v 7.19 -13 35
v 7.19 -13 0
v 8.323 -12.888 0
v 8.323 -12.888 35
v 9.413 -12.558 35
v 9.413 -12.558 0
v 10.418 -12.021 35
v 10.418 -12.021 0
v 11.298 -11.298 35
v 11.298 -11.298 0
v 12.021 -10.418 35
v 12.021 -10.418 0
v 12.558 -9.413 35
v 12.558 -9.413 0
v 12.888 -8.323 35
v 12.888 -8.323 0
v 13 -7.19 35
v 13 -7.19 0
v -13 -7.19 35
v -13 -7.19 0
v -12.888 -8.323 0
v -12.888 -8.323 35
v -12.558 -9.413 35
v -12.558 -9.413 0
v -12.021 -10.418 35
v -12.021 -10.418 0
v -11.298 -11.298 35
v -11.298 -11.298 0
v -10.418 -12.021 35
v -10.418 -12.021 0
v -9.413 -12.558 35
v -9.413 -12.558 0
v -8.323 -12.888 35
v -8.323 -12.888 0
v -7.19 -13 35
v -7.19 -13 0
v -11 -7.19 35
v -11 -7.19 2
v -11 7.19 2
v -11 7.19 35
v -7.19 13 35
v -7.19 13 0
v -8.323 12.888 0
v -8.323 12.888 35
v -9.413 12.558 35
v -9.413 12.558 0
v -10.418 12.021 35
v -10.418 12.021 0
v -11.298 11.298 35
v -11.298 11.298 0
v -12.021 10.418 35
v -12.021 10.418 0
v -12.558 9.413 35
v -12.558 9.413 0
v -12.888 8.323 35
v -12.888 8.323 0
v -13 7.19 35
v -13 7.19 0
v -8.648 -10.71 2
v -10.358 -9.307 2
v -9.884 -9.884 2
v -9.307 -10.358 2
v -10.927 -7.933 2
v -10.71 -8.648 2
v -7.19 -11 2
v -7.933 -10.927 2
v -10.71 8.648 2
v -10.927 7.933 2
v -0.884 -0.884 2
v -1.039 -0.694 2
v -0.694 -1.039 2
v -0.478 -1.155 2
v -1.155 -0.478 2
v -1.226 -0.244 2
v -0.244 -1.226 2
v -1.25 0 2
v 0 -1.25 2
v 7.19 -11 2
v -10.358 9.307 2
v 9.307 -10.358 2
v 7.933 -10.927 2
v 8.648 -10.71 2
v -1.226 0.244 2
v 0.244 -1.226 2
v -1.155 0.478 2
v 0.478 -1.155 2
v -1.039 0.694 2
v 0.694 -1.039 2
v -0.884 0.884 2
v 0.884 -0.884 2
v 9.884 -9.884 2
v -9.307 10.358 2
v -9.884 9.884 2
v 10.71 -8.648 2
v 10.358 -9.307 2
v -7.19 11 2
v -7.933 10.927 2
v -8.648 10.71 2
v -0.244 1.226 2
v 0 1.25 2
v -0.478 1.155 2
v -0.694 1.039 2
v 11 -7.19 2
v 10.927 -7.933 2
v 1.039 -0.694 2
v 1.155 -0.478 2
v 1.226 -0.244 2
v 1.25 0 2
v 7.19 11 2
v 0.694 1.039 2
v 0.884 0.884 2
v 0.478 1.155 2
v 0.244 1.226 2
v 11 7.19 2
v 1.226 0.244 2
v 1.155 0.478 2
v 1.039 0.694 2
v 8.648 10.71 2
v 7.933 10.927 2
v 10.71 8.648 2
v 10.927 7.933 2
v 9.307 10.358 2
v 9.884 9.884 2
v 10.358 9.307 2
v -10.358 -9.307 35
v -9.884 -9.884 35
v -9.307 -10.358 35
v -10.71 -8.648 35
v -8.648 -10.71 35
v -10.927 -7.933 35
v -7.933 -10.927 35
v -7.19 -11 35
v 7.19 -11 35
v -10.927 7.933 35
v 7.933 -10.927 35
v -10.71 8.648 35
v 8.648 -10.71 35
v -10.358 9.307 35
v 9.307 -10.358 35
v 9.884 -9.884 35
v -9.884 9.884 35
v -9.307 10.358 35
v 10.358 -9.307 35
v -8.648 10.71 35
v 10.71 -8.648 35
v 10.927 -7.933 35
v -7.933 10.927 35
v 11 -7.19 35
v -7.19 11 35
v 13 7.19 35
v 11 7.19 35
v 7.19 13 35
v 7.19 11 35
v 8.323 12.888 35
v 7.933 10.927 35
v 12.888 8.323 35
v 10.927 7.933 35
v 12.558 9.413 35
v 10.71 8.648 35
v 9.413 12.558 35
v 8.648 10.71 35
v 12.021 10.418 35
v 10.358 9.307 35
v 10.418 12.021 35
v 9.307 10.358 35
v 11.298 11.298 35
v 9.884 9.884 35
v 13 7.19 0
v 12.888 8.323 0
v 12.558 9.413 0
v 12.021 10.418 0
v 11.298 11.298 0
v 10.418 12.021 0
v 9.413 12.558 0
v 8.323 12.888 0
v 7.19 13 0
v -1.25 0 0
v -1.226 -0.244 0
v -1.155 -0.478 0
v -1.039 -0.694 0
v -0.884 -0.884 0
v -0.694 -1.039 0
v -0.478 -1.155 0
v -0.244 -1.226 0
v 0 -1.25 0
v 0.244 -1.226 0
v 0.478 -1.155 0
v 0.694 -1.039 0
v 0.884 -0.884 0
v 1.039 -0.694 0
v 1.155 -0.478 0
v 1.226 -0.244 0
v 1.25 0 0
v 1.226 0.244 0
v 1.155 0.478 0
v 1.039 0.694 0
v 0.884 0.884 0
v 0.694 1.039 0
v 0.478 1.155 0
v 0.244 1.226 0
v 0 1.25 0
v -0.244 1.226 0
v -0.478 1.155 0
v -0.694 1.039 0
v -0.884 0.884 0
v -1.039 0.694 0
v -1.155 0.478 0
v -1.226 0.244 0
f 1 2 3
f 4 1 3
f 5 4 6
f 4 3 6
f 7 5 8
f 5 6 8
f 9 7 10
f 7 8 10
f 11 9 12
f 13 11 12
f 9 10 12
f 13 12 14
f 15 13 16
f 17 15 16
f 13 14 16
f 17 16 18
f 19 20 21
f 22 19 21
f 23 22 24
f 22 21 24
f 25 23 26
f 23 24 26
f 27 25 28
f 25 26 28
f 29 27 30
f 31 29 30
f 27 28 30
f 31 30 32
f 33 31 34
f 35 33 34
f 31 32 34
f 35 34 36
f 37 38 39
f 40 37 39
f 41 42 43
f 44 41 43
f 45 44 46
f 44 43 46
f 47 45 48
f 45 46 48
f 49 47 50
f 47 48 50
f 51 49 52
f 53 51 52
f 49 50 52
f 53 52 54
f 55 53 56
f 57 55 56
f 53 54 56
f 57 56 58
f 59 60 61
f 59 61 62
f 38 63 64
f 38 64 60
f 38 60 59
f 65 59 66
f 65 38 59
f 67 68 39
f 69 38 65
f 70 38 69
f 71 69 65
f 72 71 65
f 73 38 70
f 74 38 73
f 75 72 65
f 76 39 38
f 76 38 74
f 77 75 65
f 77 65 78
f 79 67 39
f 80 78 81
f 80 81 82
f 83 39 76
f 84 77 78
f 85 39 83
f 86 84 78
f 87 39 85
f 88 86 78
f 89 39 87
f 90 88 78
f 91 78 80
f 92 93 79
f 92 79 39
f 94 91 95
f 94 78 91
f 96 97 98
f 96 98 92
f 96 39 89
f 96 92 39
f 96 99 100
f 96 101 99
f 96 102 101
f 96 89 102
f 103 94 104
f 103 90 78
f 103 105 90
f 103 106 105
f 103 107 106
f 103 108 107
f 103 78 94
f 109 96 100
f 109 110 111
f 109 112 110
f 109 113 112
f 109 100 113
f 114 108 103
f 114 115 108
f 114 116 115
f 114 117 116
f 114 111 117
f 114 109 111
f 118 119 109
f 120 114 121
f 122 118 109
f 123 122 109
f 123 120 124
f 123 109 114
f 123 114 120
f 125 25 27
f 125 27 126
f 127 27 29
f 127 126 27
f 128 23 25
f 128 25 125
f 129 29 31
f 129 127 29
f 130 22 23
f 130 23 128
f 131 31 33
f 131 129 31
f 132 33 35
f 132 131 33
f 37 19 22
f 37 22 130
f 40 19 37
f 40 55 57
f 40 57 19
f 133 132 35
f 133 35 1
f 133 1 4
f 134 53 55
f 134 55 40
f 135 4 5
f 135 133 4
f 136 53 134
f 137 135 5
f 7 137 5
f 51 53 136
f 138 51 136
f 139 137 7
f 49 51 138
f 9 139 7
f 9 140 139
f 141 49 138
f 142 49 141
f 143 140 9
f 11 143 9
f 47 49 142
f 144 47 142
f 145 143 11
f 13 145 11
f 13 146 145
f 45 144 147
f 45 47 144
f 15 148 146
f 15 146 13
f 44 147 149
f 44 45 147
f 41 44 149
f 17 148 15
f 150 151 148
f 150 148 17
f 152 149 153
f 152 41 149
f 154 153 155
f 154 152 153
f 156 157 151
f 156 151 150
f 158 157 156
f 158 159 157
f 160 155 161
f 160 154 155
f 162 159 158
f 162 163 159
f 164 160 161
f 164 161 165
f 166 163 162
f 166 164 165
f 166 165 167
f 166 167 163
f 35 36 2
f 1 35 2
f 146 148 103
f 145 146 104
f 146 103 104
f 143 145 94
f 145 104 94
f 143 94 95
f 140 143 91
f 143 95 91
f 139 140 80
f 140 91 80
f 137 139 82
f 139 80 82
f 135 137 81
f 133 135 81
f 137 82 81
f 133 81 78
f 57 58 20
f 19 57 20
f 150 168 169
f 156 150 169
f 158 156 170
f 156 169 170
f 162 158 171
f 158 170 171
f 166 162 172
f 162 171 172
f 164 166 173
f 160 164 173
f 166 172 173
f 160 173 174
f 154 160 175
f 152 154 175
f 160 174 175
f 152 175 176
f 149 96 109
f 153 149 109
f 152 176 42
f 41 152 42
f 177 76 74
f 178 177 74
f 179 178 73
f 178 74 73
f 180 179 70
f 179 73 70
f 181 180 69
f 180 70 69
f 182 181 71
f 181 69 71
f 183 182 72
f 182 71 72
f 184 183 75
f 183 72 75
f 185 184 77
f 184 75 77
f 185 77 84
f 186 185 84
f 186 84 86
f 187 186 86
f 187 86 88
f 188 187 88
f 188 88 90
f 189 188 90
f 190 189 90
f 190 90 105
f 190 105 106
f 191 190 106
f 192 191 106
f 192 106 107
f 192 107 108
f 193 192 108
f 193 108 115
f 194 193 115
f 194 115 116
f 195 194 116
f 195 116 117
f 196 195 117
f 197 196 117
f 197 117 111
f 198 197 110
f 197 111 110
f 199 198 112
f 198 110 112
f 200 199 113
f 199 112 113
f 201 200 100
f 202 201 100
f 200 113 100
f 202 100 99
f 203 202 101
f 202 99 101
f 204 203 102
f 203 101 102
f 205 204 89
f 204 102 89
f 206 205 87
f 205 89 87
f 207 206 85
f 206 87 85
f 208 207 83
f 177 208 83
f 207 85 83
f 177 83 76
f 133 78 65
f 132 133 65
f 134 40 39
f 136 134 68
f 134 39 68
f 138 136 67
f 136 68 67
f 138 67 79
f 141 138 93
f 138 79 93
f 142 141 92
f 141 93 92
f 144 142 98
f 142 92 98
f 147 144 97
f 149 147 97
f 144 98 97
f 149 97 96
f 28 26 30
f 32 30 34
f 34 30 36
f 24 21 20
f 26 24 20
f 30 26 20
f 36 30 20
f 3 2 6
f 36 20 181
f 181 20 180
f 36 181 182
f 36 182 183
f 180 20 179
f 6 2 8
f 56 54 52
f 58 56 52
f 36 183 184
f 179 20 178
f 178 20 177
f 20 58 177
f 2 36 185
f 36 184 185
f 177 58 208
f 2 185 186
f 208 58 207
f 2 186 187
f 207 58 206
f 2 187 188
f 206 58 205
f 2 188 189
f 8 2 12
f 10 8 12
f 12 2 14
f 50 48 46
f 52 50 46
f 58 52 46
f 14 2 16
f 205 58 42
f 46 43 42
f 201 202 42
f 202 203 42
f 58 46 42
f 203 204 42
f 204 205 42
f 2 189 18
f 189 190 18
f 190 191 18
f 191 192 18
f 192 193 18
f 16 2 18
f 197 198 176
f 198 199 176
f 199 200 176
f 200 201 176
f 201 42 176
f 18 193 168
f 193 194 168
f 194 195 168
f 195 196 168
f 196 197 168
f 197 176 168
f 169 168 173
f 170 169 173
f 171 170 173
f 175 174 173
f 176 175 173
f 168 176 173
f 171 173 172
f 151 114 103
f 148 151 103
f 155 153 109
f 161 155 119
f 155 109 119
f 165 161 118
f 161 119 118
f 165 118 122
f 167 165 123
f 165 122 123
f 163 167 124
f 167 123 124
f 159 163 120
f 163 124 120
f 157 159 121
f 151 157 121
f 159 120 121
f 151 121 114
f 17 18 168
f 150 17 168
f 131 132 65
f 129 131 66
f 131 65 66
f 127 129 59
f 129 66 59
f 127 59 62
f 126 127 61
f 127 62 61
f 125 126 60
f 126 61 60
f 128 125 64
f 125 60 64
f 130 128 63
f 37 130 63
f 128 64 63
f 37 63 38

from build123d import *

# Parameters (mm, degrees)
F1_DEPTH = 35
F2_DEPTH = 2
F3_D     = 2.5


with BuildPart() as f1:
    # F0 (on Top) → F1 (new body)
    with BuildSketch(Plane.XY):
        with BuildLine():
            Line((13, -7.19), (13, 7.19))
            ThreePointArc((13, 7.19), (11.29829, 11.29829), (7.19, 13))
            Line((7.19, 13), (-7.19, 13))
            ThreePointArc((-7.19, 13), (-11.29829, 11.29829), (-13, 7.19))
            Line((-13, 7.19), (-13, -7.19))
            ThreePointArc((-13, -7.19), (-11.29829, -11.29829), (-7.19, -13))
            Line((-7.19, -13), (7.19, -13))
            ThreePointArc((7.19, -13), (11.29829, -11.29829), (13, -7.19))
        make_face()
        with BuildLine():
            ThreePointArc((-11, 7.19), (-9.884077, 9.884077), (-7.19, 11))
            Line((-7.19, 11), (7.19, 11))
            ThreePointArc((7.19, 11), (9.884077, 9.884077), (11, 7.19))
            Line((11, 7.19), (11, -7.19))
            ThreePointArc((11, -7.19), (9.884077, -9.884077), (7.19, -11))
            Line((7.19, -11), (-7.19, -11))
            ThreePointArc((-7.19, -11), (-9.884077, -9.884077), (-11, -7.19))
            Line((-11, -7.19), (-11, 7.19))
        make_face(mode=Mode.SUBTRACT)
    extrude(amount=F1_DEPTH)

    # F0 (on Top) → F2 (join)
    with BuildSketch(Plane.XY):
        with BuildLine():
            Line((7.19, 11), (-7.19, 11))
            ThreePointArc((-7.19, 11), (-9.884077, 9.884077), (-11, 7.19))
            Line((-11, 7.19), (-11, -7.19))
            ThreePointArc((-11, -7.19), (-9.884077, -9.884077), (-7.19, -11))
            Line((-7.19, -11), (7.19, -11))
            ThreePointArc((7.19, -11), (9.884077, -9.884077), (11, -7.19))
            Line((11, -7.19), (11, 7.19))
            ThreePointArc((11, 7.19), (9.884077, 9.884077), (7.19, 11))
        make_face()
    extrude(amount=F2_DEPTH)

    # F3 (through all)
    with Locations(Plane(origin=(0, 0, 0), x_dir=(1, 0, 0), z_dir=(0, 0, -1))):
        with Locations((0, 0)):
            Hole(F3_D / 2)


solid = f1.part
